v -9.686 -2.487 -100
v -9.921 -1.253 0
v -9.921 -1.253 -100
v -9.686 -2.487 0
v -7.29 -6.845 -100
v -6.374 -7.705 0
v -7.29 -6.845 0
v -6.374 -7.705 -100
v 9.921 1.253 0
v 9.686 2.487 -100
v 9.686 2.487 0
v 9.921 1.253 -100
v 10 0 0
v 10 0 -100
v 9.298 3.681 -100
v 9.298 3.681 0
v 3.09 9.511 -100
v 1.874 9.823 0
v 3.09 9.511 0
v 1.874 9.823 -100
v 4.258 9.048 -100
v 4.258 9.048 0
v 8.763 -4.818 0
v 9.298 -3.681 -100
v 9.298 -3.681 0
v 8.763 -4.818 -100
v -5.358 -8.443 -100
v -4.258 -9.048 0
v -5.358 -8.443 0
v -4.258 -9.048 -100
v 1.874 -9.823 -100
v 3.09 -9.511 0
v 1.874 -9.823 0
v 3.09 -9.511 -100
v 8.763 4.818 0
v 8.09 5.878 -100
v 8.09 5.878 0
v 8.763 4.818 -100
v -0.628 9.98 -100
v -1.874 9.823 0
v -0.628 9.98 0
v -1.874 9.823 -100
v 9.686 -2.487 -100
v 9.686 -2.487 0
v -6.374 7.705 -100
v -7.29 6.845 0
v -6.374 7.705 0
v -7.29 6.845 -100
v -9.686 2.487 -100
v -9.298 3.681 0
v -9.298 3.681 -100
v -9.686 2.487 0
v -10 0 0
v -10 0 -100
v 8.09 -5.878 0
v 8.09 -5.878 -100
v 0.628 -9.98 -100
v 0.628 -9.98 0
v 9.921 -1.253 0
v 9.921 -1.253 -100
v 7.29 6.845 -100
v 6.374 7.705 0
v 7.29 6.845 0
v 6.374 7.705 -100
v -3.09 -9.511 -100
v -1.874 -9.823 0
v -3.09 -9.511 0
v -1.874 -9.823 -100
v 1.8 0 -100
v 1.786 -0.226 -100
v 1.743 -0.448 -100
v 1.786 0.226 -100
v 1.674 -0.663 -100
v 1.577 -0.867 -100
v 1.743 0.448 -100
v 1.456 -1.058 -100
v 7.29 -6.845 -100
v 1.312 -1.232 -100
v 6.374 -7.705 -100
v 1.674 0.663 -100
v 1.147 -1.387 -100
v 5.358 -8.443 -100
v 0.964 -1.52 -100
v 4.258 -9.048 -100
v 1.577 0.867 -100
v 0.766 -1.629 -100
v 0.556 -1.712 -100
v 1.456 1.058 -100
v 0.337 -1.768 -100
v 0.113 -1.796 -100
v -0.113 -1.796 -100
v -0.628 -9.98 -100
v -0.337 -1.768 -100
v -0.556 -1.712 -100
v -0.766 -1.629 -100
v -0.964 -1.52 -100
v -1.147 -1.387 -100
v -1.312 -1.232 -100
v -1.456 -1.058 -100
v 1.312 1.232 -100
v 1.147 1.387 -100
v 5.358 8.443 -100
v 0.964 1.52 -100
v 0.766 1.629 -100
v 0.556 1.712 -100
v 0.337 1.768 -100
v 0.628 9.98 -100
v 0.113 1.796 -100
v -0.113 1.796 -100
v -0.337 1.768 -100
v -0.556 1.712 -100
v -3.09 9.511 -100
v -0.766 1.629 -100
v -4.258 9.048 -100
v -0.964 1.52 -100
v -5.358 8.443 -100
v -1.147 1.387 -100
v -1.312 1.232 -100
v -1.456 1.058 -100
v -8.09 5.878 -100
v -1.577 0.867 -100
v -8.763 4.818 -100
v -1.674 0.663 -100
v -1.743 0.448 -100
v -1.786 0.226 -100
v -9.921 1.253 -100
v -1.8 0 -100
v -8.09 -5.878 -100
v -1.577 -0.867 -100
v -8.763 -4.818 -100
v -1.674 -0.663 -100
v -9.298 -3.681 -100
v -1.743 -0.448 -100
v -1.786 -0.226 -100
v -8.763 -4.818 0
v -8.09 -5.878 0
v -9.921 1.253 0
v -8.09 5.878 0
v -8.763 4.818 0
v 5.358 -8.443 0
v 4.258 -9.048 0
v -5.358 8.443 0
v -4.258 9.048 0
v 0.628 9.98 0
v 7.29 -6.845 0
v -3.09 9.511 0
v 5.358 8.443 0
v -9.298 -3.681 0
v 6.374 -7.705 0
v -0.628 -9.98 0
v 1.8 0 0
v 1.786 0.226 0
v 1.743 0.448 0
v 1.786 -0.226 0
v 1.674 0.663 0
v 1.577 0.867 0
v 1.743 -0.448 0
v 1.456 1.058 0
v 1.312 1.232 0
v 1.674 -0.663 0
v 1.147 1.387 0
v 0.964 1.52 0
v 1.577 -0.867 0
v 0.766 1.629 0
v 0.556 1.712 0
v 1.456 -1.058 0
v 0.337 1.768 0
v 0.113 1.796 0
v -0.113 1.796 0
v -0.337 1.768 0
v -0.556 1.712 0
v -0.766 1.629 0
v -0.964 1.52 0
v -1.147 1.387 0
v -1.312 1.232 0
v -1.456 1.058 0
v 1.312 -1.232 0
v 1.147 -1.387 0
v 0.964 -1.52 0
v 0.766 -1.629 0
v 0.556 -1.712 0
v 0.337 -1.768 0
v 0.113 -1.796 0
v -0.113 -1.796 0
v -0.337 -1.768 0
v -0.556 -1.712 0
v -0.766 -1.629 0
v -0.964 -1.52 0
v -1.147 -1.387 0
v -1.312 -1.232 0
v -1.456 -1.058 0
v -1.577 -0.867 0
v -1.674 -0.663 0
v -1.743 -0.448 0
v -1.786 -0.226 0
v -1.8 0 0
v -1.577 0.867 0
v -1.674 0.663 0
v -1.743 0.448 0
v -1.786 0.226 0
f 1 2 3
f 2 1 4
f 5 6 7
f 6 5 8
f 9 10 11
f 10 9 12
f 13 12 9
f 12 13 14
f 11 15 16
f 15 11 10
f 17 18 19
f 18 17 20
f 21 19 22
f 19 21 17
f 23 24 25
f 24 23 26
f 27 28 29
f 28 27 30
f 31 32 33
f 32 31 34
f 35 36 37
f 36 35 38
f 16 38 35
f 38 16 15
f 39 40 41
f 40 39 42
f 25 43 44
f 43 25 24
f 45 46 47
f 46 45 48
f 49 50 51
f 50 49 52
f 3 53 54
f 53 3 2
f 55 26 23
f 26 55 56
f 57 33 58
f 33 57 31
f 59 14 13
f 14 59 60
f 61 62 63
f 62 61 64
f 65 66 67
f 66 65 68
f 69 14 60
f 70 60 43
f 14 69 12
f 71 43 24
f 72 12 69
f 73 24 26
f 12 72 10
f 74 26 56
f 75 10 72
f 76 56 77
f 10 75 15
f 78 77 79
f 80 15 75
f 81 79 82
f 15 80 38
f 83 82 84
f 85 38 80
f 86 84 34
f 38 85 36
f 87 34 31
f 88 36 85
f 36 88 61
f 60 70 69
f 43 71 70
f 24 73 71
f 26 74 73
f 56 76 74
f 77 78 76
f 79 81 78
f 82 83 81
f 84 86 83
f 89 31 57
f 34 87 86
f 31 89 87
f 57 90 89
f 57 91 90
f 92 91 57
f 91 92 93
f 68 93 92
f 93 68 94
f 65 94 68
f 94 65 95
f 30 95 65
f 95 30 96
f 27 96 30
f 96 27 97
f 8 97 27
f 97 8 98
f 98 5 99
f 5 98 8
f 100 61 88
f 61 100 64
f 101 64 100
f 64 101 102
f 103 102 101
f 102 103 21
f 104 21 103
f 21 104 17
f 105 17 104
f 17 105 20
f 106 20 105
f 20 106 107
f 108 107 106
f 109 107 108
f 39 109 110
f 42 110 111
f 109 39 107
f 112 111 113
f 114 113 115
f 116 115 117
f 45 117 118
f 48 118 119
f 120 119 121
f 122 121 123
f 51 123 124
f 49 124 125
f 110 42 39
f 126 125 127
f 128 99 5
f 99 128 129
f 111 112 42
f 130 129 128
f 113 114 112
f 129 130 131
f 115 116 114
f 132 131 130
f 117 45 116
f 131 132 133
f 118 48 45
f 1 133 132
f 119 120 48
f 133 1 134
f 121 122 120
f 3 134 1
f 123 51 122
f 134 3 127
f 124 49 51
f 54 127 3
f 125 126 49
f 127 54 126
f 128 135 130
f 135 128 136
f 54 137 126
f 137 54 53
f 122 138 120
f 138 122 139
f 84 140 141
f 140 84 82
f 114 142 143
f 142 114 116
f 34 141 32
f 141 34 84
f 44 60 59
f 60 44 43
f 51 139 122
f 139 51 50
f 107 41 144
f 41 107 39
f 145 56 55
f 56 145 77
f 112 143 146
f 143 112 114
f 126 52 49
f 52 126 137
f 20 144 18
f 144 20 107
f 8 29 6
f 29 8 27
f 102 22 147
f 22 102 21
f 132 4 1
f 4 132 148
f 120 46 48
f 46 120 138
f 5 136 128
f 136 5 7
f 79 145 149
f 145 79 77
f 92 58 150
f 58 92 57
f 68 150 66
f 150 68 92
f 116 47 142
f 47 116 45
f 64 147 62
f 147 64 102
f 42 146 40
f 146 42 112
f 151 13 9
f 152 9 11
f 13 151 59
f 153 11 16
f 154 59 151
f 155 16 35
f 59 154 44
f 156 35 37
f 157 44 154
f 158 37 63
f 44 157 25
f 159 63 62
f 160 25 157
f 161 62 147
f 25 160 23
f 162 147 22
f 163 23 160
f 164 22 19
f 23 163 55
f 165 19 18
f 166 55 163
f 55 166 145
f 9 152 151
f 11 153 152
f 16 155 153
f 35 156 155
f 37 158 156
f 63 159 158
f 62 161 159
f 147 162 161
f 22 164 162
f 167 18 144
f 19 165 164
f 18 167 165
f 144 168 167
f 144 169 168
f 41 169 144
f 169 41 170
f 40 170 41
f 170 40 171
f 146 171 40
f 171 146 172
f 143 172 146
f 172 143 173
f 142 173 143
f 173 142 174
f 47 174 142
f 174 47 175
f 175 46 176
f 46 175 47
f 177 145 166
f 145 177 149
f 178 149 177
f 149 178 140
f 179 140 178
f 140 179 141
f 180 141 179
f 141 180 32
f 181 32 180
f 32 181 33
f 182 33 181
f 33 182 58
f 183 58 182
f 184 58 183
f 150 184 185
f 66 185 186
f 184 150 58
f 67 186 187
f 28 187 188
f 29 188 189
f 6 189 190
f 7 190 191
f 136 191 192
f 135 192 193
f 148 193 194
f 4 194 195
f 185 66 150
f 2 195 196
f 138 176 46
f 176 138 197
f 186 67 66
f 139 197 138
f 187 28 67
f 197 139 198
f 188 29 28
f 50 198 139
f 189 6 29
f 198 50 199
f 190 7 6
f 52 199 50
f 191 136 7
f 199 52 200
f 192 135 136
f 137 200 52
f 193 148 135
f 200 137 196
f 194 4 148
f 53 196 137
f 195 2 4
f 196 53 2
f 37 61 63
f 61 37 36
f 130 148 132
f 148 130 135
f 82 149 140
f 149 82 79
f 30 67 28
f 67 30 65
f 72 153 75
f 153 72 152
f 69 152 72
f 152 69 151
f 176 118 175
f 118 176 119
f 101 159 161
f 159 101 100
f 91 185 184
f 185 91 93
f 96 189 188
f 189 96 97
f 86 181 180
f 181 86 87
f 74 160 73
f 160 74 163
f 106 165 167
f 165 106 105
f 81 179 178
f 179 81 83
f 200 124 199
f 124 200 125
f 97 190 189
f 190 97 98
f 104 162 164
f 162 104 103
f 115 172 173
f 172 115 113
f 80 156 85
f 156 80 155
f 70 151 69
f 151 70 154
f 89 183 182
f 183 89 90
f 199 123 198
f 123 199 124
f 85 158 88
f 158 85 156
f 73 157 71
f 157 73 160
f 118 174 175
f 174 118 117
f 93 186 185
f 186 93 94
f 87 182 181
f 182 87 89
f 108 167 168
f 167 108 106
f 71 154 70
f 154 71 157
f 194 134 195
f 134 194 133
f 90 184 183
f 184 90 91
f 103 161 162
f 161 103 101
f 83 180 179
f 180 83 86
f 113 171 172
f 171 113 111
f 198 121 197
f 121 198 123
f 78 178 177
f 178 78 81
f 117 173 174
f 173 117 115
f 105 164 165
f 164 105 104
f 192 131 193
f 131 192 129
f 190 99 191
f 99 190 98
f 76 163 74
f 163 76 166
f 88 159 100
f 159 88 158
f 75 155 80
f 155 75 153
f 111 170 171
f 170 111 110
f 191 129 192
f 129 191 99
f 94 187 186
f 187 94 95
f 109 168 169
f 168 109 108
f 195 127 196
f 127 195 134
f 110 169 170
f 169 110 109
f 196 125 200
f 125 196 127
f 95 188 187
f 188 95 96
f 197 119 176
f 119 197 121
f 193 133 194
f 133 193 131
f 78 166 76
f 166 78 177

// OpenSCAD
$fn = 50;


difference() {
	union() {
		translate(v = [0, 0, -100.0000000000]) {
			cylinder(h = 100, r = 10.0000000000);
		}
		cylinder(h = 0, r = 20.0000000000);
	}
	union() {
		#translate(v = [0, 0, -100]) {
			cylinder(h = 100, r = 1.8000000000);
		}
	}
}
